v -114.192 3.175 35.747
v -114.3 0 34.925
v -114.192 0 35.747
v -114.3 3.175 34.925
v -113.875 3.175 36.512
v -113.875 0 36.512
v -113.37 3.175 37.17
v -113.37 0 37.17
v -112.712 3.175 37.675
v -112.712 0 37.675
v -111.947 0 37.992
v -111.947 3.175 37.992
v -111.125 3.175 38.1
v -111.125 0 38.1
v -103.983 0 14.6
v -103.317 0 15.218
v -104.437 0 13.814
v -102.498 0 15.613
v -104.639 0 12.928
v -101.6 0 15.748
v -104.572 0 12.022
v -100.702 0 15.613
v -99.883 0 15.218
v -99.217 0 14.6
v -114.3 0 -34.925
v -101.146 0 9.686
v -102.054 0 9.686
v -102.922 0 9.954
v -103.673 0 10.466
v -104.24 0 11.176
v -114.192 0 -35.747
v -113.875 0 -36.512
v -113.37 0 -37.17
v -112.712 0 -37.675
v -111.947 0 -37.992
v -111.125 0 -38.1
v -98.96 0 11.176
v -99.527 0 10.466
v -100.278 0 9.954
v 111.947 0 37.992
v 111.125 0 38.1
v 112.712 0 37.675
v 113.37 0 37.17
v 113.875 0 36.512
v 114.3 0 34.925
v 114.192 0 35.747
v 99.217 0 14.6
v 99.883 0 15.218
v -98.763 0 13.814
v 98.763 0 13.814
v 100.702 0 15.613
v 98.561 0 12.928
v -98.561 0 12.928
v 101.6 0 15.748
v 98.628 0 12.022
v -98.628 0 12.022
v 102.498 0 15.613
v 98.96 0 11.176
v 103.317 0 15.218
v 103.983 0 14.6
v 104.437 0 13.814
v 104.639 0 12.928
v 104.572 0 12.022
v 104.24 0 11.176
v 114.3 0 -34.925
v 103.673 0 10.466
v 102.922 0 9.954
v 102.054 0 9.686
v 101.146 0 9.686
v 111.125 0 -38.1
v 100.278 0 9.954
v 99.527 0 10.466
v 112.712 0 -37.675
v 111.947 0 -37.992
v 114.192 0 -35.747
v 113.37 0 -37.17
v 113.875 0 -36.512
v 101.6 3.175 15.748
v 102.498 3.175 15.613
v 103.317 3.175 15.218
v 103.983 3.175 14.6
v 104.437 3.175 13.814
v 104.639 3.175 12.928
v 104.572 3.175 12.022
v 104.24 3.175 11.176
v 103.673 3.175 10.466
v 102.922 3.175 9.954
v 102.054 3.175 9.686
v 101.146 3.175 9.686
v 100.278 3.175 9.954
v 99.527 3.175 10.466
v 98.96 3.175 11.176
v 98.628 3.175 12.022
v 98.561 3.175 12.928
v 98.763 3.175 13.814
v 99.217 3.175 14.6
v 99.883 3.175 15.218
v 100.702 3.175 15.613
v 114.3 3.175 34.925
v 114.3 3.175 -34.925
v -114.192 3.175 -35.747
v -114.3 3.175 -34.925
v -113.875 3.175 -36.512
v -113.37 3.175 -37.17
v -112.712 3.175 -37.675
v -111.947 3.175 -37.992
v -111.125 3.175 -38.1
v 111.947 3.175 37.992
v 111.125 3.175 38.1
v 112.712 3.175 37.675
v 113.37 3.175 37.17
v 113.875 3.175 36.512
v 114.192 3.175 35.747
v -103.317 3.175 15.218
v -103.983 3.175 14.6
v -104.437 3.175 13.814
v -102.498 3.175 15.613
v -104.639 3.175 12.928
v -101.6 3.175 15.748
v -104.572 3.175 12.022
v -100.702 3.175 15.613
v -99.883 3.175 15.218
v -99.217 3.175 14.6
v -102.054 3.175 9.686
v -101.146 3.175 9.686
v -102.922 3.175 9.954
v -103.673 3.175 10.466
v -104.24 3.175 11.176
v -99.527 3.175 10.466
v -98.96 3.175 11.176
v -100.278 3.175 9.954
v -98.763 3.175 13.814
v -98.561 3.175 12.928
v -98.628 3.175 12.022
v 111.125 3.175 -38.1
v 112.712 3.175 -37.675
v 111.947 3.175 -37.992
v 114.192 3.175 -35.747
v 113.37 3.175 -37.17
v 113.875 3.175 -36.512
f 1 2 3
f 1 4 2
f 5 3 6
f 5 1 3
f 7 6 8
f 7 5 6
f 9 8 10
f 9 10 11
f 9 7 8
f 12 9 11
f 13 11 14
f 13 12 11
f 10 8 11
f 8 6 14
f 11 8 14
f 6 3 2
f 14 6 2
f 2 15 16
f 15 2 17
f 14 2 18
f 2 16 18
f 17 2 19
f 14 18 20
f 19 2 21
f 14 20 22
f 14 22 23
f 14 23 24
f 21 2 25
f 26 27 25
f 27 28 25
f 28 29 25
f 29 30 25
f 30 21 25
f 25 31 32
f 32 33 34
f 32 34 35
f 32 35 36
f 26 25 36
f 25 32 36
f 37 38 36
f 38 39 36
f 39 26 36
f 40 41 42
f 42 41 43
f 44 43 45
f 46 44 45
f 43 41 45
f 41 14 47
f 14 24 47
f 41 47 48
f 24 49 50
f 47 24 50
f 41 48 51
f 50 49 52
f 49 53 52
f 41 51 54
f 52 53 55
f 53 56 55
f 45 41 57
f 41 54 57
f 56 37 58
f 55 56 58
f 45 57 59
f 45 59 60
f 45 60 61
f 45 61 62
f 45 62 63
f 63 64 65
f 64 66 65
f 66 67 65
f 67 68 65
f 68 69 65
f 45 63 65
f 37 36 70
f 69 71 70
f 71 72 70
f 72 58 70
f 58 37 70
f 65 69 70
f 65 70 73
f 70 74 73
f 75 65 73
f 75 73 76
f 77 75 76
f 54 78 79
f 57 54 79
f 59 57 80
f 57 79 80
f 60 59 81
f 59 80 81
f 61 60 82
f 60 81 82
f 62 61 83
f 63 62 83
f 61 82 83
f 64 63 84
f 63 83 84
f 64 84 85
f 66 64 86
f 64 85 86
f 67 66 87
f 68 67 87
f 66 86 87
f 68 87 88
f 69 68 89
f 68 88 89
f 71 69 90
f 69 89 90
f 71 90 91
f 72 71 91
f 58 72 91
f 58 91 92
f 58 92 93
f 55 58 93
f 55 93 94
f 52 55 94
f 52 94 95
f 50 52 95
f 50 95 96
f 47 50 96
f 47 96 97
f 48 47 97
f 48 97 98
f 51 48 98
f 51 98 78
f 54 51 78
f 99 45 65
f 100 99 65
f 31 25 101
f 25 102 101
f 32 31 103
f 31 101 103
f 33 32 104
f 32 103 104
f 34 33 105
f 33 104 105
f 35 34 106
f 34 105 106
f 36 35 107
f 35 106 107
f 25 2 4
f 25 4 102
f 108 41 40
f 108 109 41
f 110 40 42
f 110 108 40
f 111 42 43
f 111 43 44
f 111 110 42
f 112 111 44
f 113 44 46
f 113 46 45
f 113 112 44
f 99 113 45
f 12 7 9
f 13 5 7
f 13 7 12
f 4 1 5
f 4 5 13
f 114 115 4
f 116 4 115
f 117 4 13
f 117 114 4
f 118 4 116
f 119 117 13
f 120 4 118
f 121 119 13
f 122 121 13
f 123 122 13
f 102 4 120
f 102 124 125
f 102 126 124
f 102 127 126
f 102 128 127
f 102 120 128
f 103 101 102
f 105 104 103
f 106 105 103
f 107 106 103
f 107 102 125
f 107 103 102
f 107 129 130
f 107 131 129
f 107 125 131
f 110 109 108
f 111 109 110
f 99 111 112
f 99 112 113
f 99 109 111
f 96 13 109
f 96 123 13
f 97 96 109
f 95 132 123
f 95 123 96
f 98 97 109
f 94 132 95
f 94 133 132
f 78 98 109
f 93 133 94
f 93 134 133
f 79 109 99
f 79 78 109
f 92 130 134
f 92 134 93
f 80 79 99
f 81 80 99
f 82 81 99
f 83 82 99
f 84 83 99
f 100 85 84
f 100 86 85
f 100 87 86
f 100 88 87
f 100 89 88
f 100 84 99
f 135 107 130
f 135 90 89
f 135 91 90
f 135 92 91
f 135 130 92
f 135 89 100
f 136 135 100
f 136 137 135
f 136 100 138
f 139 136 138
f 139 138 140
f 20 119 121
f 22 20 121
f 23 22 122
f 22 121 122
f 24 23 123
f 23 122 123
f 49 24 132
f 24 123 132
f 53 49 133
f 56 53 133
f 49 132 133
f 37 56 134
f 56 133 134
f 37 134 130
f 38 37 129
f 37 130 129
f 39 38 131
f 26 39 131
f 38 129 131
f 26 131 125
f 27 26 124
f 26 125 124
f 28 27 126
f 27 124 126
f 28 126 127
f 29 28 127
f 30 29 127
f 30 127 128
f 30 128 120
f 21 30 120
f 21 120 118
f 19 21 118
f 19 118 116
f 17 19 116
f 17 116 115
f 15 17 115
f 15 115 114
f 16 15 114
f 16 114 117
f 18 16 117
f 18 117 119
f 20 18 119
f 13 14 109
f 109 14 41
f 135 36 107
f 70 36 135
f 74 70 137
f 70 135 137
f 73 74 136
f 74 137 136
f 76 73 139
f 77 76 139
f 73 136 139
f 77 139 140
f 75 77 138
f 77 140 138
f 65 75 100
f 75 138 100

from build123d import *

# Parameters (mm, degrees)
SKETCH1_W           = 228.6
SKETCH1_H           = 76.2
BOSS_EXTRUDE1_DEPTH = 3.175
SKETCH2_R           = 3.048
CUT_EXTRUDE1_DEPTH  = 10
FILLET1_R           = 3.175


with BuildPart() as part:
    # Sketch1 → Boss-Extrude1 (new body)
    with BuildSketch(Plane(origin=(0, 0, 0), x_dir=(1, 0, 0), z_dir=(0, 1, 0))):
        Rectangle(SKETCH1_W, SKETCH1_H)
    extrude(amount=BOSS_EXTRUDE1_DEPTH)

    # Sketch2 → Cut-Extrude1 (cut)
    with BuildSketch(Plane(origin=(0, 3.175, 0), x_dir=(1, 0, 0), z_dir=(0, 1, 0))):
        with Locations(Location((-101.6, -12.7, 0), (0, 0, 270))):
            Circle(SKETCH2_R)
        with Locations(Location((101.6, -12.7, 0), (0, 0, 270))):
            Circle(SKETCH2_R)
    extrude(amount=-CUT_EXTRUDE1_DEPTH, mode=Mode.SUBTRACT)

    # Fillet1
    fillet1_edges = [part.edges().sort_by_distance(p)[0] for p in [
        (-114.3, 1.5875, -38.1),
        (114.3, 1.5875, -38.1),
        (114.3, 1.5875, 38.1),
        (-114.3, 1.5875, 38.1),
    ]]
    fillet(fillet1_edges, radius=FILLET1_R)


solid = part.part
